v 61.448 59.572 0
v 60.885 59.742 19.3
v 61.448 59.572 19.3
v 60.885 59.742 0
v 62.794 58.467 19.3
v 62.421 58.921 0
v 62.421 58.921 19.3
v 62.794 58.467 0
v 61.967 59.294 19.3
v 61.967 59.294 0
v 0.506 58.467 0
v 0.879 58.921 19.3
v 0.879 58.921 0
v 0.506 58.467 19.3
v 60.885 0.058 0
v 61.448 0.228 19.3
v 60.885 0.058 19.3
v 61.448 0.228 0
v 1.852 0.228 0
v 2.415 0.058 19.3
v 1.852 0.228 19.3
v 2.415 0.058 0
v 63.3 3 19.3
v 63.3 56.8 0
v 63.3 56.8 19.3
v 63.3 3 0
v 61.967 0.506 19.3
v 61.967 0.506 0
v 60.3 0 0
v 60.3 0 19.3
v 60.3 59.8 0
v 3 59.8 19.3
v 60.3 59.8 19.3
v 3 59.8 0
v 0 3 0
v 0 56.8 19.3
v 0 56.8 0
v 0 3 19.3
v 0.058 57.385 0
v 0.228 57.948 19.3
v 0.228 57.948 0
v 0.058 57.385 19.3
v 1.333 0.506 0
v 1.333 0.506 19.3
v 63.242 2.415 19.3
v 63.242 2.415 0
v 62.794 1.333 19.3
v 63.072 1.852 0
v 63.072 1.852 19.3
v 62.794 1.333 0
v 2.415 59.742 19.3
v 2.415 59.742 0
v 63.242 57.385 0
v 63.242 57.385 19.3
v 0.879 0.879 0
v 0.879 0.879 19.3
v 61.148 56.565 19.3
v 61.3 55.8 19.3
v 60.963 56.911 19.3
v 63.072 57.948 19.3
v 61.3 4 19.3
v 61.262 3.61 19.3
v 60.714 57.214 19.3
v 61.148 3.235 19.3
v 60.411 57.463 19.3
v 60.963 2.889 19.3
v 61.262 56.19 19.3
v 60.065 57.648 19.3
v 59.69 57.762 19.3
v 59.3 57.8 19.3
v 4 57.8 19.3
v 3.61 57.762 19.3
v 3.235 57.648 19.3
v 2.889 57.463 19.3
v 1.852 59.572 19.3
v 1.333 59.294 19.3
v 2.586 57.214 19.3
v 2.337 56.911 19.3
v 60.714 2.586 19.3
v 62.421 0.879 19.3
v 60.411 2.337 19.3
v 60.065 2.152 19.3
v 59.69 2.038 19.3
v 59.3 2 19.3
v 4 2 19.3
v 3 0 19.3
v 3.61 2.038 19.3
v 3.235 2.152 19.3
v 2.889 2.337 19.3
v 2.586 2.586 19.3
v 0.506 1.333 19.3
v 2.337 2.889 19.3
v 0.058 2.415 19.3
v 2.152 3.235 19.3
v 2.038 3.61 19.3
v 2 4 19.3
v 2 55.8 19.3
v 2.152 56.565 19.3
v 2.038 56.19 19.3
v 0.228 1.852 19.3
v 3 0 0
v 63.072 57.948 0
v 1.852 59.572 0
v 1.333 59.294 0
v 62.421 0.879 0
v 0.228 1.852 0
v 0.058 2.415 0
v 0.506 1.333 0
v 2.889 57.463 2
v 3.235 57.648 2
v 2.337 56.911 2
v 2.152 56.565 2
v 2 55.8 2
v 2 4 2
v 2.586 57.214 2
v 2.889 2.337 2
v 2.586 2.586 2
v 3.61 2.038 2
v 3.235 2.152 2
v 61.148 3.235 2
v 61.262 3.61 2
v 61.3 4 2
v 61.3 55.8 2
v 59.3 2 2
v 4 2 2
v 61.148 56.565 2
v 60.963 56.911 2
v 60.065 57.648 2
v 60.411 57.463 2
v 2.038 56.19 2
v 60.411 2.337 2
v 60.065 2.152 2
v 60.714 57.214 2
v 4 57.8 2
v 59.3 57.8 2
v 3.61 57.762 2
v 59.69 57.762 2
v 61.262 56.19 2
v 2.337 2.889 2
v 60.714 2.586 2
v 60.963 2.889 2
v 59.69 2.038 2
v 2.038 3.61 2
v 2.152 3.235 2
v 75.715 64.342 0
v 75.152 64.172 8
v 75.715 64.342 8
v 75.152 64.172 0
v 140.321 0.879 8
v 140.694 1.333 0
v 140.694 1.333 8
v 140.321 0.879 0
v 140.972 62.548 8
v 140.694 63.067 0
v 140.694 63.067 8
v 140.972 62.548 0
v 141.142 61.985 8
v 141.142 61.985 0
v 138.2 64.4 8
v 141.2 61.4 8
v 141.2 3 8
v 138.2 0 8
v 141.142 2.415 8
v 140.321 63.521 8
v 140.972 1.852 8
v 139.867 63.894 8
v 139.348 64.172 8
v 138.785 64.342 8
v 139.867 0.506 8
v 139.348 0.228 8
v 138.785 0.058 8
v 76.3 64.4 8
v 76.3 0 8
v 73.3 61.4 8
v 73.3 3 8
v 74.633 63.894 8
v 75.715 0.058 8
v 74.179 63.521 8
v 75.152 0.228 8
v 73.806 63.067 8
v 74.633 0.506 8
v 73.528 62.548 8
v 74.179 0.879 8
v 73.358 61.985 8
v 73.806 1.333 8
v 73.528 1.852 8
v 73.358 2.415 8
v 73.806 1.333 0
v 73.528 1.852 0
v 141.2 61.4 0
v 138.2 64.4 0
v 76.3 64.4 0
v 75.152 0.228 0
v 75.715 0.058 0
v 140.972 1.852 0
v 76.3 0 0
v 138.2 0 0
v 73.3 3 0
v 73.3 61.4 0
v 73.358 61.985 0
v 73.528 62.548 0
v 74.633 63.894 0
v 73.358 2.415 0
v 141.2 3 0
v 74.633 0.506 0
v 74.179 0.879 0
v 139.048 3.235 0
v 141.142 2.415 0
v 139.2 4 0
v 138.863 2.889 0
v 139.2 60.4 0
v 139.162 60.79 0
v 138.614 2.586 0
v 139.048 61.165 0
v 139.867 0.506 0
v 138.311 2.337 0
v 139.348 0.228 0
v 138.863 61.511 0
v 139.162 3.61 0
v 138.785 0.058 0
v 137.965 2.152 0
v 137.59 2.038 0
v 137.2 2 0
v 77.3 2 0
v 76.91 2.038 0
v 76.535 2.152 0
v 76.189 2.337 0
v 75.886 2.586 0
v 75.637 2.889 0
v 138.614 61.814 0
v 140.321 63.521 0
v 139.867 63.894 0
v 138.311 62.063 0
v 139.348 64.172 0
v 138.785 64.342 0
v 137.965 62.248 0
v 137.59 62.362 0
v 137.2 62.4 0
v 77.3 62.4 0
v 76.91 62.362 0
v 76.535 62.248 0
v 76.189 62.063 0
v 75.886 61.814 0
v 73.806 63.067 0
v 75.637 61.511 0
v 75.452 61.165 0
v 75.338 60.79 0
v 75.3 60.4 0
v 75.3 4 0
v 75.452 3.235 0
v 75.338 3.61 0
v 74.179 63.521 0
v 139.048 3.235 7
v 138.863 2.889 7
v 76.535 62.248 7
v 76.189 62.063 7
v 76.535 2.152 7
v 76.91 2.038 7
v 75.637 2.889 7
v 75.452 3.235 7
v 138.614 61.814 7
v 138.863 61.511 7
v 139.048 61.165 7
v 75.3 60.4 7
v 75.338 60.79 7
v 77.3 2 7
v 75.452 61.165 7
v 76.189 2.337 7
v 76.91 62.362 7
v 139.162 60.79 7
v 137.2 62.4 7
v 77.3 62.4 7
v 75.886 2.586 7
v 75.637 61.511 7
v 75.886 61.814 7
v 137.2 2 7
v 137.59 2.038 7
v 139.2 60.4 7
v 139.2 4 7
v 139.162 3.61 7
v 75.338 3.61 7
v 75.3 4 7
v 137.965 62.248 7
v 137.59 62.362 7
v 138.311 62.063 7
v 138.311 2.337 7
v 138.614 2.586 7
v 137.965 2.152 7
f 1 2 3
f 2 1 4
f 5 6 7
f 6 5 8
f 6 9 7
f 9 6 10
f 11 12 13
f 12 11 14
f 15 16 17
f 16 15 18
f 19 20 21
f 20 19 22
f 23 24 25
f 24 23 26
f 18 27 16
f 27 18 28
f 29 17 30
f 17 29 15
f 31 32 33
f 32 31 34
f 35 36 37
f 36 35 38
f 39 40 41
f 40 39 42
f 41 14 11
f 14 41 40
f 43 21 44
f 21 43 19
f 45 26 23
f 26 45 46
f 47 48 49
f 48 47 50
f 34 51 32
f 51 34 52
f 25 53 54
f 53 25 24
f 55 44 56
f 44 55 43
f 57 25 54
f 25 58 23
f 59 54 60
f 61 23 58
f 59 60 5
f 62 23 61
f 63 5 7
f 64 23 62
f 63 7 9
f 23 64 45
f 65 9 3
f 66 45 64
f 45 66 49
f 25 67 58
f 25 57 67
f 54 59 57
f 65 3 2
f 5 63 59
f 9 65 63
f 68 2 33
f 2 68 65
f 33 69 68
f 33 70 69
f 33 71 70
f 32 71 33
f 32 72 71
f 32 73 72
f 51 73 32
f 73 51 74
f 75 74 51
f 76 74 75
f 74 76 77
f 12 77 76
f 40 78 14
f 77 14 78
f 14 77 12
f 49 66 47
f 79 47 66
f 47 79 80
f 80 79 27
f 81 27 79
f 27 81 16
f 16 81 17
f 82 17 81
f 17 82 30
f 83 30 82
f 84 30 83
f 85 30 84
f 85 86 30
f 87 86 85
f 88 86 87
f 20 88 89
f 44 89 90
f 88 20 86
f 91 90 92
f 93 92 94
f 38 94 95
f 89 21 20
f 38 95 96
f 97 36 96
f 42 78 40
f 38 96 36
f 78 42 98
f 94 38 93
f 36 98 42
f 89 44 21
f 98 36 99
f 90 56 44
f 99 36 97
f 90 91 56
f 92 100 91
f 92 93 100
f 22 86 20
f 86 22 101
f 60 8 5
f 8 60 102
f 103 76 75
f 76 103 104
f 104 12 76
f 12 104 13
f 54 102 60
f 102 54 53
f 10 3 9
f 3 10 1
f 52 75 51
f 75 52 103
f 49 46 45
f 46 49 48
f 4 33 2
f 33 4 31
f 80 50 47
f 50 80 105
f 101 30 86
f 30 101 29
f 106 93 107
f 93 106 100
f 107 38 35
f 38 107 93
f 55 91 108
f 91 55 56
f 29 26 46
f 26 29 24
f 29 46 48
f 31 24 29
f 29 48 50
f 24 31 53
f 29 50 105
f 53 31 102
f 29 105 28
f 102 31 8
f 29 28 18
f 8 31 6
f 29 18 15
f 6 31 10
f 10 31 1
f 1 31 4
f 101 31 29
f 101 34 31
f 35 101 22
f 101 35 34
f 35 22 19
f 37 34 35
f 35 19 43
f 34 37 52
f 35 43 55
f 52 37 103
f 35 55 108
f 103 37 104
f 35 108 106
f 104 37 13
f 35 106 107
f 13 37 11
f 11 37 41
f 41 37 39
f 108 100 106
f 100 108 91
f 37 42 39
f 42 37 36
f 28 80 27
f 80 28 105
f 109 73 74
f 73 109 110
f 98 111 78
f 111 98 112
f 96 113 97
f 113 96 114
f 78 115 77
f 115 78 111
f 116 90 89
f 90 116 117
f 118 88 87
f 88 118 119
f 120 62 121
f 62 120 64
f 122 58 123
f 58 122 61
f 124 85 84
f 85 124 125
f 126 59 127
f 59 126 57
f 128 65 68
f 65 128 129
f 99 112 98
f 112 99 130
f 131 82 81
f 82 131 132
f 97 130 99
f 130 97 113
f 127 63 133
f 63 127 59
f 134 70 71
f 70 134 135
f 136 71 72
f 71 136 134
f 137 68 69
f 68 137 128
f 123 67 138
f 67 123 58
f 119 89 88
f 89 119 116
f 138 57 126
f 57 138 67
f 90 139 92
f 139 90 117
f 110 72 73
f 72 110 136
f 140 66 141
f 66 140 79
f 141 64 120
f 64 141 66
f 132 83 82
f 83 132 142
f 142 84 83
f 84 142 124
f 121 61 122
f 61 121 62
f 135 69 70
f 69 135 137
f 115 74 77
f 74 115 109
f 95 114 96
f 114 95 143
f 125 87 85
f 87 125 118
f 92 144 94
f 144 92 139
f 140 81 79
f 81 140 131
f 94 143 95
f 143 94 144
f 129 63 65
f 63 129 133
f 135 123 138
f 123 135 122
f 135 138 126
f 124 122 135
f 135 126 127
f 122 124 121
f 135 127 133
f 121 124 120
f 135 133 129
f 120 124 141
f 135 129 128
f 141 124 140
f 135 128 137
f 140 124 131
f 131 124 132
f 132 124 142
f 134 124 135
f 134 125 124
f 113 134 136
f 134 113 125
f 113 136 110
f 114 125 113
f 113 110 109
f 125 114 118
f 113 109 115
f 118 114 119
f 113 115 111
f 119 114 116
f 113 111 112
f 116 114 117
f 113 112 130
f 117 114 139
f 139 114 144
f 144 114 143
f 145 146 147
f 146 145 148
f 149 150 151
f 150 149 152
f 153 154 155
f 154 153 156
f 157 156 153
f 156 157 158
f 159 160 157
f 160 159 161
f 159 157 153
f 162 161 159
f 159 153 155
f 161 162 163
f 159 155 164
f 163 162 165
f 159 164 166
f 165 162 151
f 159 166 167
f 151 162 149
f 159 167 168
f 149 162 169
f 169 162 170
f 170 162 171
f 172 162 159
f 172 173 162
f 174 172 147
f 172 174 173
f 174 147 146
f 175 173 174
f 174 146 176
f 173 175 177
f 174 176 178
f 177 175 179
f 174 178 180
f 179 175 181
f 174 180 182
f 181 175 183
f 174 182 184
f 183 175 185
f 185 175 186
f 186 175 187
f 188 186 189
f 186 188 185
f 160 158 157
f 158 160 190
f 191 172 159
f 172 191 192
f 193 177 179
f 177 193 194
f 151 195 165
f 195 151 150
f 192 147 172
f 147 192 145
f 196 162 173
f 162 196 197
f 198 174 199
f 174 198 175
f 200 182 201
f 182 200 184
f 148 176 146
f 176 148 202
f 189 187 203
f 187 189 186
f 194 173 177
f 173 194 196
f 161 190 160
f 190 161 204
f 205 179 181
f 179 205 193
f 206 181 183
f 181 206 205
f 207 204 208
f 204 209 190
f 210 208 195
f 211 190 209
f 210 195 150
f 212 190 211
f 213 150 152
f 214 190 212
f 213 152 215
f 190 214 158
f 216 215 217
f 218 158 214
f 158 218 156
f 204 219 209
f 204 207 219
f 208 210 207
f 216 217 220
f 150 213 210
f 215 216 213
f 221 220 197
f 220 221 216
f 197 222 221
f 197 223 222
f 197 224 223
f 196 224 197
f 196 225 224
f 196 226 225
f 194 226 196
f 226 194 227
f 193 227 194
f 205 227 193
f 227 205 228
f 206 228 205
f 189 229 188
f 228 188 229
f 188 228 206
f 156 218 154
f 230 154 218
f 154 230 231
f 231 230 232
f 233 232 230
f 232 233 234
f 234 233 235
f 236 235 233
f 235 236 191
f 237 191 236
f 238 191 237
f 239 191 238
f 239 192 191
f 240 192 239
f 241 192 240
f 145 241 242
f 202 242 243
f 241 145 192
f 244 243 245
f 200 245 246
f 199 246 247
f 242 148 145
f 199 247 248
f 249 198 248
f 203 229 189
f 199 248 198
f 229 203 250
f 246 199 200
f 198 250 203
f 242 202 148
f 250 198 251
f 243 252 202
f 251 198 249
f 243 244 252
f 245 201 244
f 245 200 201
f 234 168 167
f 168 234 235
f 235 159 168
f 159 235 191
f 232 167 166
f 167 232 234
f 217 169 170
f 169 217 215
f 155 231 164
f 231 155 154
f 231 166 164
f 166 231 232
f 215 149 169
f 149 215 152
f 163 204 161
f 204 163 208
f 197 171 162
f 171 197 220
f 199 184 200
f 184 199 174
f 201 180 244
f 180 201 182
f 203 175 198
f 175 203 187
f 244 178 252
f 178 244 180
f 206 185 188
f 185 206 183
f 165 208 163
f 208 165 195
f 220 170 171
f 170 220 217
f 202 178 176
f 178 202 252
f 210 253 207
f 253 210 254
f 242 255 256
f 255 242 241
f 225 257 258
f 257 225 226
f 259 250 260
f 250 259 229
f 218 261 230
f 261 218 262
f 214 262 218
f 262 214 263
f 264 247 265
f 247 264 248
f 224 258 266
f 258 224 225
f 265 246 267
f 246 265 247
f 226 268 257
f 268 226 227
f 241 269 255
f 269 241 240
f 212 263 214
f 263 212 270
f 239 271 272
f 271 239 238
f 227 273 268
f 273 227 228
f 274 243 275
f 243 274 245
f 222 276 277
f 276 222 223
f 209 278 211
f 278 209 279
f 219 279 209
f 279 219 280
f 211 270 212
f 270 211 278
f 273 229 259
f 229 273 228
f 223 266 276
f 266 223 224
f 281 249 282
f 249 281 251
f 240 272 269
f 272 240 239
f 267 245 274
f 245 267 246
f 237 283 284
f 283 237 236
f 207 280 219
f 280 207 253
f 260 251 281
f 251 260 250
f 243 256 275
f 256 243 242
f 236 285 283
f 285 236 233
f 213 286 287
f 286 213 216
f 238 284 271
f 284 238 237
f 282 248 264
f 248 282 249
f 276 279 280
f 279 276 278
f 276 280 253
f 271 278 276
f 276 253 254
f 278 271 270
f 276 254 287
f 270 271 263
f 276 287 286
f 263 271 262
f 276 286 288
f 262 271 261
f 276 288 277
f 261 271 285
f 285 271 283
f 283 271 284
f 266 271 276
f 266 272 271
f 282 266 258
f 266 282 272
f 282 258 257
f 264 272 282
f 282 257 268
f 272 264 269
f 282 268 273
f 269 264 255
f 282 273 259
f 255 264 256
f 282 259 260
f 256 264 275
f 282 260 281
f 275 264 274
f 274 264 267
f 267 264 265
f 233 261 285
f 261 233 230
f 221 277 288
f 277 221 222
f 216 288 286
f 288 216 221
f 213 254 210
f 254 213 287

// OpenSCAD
// delta_collar_enclosure_v1.scad
// Parametric starting point for the Stage 1B smaller 3D-printed enclosure.
// Delta collar project.
// See docs/2026-09-06_stage1b_printer_arrival_and_enclosure_kickoff.md
//
// v0.2 - 2026-09-06: split into a two-part BASE + LID (slip-over skirt lid,
// like a shoebox lid), confirmed after v0.1 rendered correctly in OpenSCAD
// but turned out to be a fully sealed shell with no way to insert parts.
// No fasteners or glue -- matches the "close the lid gently, don't force it"
// approach already used for the larger off-the-shelf enclosure.
//
// Layout (unchanged from v0.1):
//   - LSM6DSOX is mounted to the UNDERSIDE of the Feather (taped back-to-back,
//     matching docs/2026-08-14_stage1_enclosure_bench_and_calibration.md),
//     so it adds to the STACK HEIGHT under the Feather, not to the footprint.
//   - Feather sits at the "top" of the base footprint, LiPo sits beside/below
//     it in the same length-wise lane, both flat on the base floor.
//
// IMPORTANT: all dimensions below are still NOMINAL values pulled from
// public Adafruit product pages, NOT measurements of the actual parts.
// High-precision calipers are arriving 2026-09-07 -- update every variable
// below marked "verify" with the real measurement before finalizing v0.3.
// This v0.2 is still for a physical dry-fit / lid-fit test print, not a
// final assembly: no switch cutout or cable strain relief yet.

// ---------- Component nominal dimensions (mm) ----------
feather_l = 52.3; feather_w = 22.8; feather_h = 7.2; // bare PCB only -- verify
feather_header_clearance = 3.0; // extra height for soldered headers -- verify
feather_usb_overhang = 3.0;     // USB-C connector overhang beyond board edge -- verify

lsm6dsox_l = 25.6; lsm6dsox_w = 17.8; lsm6dsox_h = 4.6; // verify
imu_mount_gap = 1.0; // double-sided tape / standoff gap between Feather underside and IMU -- verify

lipo_l = 36; lipo_w = 29; lipo_h = 4.75; // add roughly 10-15 percent thickness margin -- verify

// JST switch and STEMMA QT cable clearances are not published by Adafruit.
// These are placeholders -- measure the real parts before relying on them.
jst_switch_l = 25; jst_switch_w = 10; jst_switch_h = 6; // verify
cable_bend_clearance = 8; // minimum radius to keep STEMMA QT cable from a sharp bend -- verify

// ---------- Base layout ----------
wall_t = 2.0;              // wall thickness -- tune for your printer/material
board_gap = 4.0;           // gap between the Feather lane and the LiPo lane
headroom = 1.5;            // clear space above the tallest internal stack, below the open top
foam_pad_thickness = 3;    // neoprene foam pad thickness on the dog-facing side (added after printing, not printed)

feather_stack_h = feather_h + feather_header_clearance + imu_mount_gap + lsm6dsox_h;

internal_l = max(feather_l + feather_usb_overhang, lipo_l) + 4; // + margin for cable routing
internal_w = feather_w + board_gap + lipo_w;
internal_h = max(feather_stack_h, lipo_h) + headroom;

base_external_l = internal_l + 2 * wall_t;
base_external_w = internal_w + 2 * wall_t;
base_external_h = internal_h + wall_t; // floor only -- top stays open, lid covers it

echo(str("Base external (approx, mm): ", base_external_l, " x ", base_external_w, " x ", base_external_h));

// ---------- Lid: slips down over the OUTSIDE of the base, like a shoebox lid ----------
lid_fit_clearance = 0.3; // per-side gap so the lid slides over the base -- tune after test fit
lid_skirt_h = 6;         // how far the lid overlaps down over the base wall for grip -- verify feels secure
lid_top_t = wall_t;      // lid top thickness

lid_cavity_l = base_external_l + 2 * lid_fit_clearance;
lid_cavity_w = base_external_w + 2 * lid_fit_clearance;
lid_outer_l = lid_cavity_l + 2 * wall_t;
lid_outer_w = lid_cavity_w + 2 * wall_t;
lid_outer_h = lid_skirt_h + lid_top_t;

echo(str("Lid external (approx, mm): ", lid_outer_l, " x ", lid_outer_w, " x ", lid_outer_h));

// ---------- Shared shape helper ----------
module rounded_box(l, w, h, r) {
    hull() {
        for (x = [r, l - r])
            for (y = [r, w - r])
                translate([x, y, 0])
                    cylinder(r = r, h = h, $fn = 32);
    }
}

// ---------- Base: open-top tray ----------
module base_shell() {
    difference() {
        rounded_box(base_external_l, base_external_w, base_external_h, 3);
        // cavity extends above the top face so the top is fully open
        translate([wall_t, wall_t, wall_t])
            rounded_box(internal_l, internal_w, internal_h + 1, 2);
    }
}

// ---------- Lid: cap with a skirt that slips over the base ----------
module lid_shell() {
    difference() {
        rounded_box(lid_outer_l, lid_outer_w, lid_outer_h, 3);
        // cavity from the bottom up through the skirt height, leaving a solid top cap
        translate([wall_t, wall_t, 0])
            rounded_box(lid_cavity_l, lid_cavity_w, lid_skirt_h + 1, 2);
    }
}

// ---------- Render: base on the left, lid on the right, both flat on the bed ----------
base_shell();

translate([base_external_l + 10, 0, 0])
    lid_shell();

// ---------- Component placement guides on the base (visual dry-fit reference only) ----------
// Feather lane (top of footprint)
%translate([wall_t + 2, wall_t + 2, wall_t + imu_mount_gap + lsm6dsox_h])
    cube([feather_l, feather_w, feather_h]);

// LSM6DSOX taped to the Feather underside -- shown touching the base floor,
// with the Feather sitting on top of it (component-side up). Flip this if
// the real assembly is mounted the other way up.
%translate([wall_t + 2 + (feather_l - lsm6dsox_l) / 2, wall_t + 2 + (feather_w - lsm6dsox_w) / 2, wall_t])
    cube([lsm6dsox_l, lsm6dsox_w, lsm6dsox_h]);

// LiPo lane (below the Feather lane in Y), resting flat on the base floor
%translate([wall_t + 2, wall_t + feather_w + board_gap, wall_t])
    cube([lipo_l, lipo_w, lipo_h]);
